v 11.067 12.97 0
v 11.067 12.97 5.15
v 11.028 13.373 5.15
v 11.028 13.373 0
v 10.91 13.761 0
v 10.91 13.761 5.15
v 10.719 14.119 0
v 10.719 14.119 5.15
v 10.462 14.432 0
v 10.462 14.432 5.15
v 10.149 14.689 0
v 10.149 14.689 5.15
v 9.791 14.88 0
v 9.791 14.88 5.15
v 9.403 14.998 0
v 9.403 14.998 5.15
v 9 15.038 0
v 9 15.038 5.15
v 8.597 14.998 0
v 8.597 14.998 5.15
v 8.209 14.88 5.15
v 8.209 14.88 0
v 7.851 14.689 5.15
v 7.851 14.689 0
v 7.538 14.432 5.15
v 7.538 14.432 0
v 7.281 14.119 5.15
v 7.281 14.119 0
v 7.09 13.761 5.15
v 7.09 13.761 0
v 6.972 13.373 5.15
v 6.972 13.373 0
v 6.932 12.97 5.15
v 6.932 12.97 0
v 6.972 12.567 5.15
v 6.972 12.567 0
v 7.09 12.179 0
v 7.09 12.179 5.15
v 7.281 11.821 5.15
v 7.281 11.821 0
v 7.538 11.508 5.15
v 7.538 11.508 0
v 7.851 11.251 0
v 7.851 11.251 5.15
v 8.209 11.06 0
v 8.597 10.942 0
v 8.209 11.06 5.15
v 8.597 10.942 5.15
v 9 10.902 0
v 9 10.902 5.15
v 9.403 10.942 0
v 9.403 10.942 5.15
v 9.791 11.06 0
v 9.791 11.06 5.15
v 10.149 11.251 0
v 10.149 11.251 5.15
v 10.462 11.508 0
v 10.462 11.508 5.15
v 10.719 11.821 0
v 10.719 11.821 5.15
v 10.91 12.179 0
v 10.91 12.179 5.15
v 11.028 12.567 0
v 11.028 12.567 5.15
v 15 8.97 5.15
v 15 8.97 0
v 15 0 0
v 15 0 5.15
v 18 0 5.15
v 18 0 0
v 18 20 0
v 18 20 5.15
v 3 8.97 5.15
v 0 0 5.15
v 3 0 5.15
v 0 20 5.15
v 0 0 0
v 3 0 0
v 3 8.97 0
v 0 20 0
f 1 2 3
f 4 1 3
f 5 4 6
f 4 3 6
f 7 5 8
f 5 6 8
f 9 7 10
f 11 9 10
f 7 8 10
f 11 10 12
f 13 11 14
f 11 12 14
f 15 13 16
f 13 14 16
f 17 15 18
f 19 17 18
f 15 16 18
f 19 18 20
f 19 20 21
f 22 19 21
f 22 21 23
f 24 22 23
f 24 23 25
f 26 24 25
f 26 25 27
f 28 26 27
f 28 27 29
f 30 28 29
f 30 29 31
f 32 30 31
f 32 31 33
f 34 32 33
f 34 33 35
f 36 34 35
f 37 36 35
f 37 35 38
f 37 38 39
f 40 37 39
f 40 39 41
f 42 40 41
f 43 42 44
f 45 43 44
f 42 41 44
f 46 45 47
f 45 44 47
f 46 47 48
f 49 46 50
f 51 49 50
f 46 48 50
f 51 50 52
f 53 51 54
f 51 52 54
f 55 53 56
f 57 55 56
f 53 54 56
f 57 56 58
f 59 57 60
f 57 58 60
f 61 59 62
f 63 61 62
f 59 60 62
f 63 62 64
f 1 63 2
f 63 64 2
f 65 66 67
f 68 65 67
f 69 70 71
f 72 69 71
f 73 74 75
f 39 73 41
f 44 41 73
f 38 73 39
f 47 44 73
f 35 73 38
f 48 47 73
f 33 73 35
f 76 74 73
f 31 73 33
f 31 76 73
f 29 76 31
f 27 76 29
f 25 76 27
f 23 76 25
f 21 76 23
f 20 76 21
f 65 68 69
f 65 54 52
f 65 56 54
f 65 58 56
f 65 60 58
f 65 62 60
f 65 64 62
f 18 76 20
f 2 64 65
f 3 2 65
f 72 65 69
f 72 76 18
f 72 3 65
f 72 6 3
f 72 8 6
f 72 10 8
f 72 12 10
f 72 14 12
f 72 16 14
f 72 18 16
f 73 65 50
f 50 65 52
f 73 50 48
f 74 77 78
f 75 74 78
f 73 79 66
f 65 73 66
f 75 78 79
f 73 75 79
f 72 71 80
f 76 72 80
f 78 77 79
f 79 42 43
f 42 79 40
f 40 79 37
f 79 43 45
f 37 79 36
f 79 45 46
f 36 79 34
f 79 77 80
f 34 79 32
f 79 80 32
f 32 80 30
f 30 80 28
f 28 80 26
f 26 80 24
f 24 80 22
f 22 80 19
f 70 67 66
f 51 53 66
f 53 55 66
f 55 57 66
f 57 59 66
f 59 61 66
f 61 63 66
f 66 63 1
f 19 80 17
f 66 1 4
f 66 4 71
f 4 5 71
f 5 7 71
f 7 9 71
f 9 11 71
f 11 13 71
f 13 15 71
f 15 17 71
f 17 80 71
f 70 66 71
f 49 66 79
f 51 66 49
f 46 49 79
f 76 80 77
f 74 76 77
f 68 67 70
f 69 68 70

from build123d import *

# Parameters (mm, degrees)
BOSS_EXTRUDE1_DEPTH = 5.15
SKETCH3_R           = 2.0675
CUT_EXTRUDE1_DEPTH  = 6.15


with BuildPart() as part:
    # Sketch1 → Boss-Extrude1 (new body)
    with BuildSketch(Plane.XY):
        Polygon((0, 0), (3, 0), (3, 8.97), (15, 8.97), (15, 0), (18, 0), (18, 20), (0, 20), align=None)
    extrude(amount=BOSS_EXTRUDE1_DEPTH)

    # Sketch3 → Cut-Extrude1 (cut, through all)
    with BuildSketch(Plane.XY.offset(5.15)):
        with Locations((9, 12.97)):
            Circle(SKETCH3_R)
    extrude(amount=-CUT_EXTRUDE1_DEPTH, mode=Mode.SUBTRACT)


solid = part.part
